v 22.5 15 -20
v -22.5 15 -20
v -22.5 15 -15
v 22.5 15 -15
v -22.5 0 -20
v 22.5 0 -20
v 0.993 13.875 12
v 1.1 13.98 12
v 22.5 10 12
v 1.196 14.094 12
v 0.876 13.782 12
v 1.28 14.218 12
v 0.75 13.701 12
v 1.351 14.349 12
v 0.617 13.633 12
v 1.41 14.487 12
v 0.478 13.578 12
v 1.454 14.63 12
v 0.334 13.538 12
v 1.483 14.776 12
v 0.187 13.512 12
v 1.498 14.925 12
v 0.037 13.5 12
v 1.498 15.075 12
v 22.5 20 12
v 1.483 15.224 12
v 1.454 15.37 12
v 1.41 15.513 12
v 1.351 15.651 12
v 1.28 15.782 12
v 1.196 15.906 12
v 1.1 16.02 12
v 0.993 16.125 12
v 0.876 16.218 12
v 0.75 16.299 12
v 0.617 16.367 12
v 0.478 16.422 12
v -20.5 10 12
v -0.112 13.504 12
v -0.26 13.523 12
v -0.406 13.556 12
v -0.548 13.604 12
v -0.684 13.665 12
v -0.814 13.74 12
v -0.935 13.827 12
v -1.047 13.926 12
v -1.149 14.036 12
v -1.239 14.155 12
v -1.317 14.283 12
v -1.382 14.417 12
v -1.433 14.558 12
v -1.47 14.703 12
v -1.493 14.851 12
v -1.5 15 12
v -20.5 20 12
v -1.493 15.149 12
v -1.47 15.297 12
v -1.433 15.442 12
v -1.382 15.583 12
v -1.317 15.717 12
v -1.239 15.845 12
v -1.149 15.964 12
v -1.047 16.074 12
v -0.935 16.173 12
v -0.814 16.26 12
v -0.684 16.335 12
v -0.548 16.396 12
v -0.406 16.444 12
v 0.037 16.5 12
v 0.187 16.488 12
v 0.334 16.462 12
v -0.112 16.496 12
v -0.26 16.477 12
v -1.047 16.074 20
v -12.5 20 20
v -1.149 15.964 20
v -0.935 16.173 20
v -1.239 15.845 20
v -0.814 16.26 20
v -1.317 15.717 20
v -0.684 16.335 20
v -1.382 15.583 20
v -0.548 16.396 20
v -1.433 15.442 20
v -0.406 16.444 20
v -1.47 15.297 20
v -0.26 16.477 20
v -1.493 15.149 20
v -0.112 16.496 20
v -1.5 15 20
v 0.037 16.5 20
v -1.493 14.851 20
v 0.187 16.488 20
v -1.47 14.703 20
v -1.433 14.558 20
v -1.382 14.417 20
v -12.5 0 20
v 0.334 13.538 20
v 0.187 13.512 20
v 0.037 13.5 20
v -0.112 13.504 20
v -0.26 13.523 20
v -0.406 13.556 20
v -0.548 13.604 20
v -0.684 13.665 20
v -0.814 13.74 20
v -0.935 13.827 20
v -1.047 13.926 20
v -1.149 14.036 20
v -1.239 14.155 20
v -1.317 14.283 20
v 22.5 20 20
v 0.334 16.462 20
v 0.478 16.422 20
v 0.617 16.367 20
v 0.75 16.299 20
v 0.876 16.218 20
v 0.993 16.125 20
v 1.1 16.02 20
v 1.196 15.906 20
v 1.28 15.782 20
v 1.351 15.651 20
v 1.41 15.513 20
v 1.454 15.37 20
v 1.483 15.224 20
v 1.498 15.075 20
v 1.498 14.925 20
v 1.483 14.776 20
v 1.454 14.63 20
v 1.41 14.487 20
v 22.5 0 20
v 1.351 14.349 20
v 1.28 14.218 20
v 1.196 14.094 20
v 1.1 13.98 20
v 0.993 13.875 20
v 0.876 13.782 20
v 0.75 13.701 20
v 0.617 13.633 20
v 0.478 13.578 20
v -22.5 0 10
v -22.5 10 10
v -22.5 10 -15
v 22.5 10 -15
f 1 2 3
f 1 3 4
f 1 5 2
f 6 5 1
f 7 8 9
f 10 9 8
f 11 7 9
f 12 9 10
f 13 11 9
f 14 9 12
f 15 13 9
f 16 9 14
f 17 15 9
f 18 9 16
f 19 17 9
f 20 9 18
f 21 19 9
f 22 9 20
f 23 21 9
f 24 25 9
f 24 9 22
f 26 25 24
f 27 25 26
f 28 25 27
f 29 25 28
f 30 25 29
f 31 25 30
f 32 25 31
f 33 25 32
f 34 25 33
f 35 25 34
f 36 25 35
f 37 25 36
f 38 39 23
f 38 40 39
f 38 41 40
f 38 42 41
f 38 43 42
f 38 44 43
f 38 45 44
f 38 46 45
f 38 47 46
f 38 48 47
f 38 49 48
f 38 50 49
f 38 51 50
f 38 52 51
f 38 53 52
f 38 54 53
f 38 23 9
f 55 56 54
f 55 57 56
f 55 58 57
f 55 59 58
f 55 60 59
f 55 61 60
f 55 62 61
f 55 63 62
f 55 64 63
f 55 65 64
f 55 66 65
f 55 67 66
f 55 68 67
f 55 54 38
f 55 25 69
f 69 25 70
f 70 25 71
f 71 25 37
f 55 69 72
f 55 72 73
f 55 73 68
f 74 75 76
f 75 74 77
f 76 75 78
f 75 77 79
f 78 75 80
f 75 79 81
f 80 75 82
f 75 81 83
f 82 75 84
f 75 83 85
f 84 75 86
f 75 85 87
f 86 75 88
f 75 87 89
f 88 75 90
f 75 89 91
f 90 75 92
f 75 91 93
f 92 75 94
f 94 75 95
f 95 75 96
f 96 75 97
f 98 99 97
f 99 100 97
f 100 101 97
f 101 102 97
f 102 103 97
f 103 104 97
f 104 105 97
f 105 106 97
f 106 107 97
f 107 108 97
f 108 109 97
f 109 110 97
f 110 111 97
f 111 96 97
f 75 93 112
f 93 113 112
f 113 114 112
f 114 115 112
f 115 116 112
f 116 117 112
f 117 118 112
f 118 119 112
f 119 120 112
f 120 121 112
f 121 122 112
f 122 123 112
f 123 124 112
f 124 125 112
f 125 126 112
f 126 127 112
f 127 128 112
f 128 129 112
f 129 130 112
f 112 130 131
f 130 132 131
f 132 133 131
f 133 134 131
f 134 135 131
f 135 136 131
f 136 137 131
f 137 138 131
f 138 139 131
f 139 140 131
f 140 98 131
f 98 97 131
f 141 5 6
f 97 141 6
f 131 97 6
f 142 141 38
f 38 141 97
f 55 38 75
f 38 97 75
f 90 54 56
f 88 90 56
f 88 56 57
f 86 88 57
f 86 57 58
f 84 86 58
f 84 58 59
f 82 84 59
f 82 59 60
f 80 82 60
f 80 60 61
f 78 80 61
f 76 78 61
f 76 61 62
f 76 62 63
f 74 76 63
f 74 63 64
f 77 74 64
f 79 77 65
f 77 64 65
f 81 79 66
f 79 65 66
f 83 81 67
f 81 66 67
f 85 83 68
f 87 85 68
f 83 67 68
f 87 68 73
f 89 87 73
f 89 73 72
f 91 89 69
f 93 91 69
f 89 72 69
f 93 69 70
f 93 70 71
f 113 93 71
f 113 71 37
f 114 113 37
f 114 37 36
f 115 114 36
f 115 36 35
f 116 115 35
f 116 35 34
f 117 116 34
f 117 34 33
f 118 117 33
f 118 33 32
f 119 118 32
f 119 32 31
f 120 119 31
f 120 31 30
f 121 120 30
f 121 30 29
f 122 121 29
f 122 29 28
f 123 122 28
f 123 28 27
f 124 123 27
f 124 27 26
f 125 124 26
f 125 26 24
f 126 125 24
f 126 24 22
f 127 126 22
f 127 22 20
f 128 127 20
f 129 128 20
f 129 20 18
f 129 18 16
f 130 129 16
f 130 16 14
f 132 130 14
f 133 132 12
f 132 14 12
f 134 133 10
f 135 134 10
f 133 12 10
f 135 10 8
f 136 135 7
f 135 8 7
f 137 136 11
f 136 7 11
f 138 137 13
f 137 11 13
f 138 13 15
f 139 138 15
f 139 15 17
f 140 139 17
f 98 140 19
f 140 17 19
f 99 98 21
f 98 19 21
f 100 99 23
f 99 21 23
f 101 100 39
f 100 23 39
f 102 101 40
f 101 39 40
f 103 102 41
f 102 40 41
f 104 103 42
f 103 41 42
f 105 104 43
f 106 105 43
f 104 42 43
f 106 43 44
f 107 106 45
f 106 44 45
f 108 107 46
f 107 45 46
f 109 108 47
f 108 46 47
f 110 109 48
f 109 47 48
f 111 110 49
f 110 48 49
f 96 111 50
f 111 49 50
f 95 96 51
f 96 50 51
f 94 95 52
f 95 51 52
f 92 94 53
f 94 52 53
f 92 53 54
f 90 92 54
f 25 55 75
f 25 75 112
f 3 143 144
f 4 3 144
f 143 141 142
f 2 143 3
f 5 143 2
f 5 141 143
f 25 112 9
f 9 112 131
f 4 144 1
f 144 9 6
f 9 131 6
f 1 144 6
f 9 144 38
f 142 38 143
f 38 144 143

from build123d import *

# Parameters (mm, degrees)
SKETCH_1_W          = 45
SKETCH_1_H          = 40
EXTRUDE_1_DEPTH     = 20
SKETCH_2_W          = 45
SKETCH_2_H          = 10
CUT_EXTRUDE_1_DEPTH = 32
SKETCH_3_W          = 45
SKETCH_3_H          = 5
EXTRUDE_2_DEPTH     = 5
SKETCH_4_R          = 1.5
CUT_EXTRUDE_2_DEPTH = 44.934610502
CHAMFER_1_SIZE      = 10


with BuildPart() as part:
    # 草图1 → 凸台-拉伸1 (new body)
    with BuildSketch(Plane(origin=(0, 0, 0), x_dir=(1, 0, 0), z_dir=(0, 1, 0))):
        Rectangle(SKETCH_1_W, SKETCH_1_H)
    extrude(amount=EXTRUDE_1_DEPTH)

    # 草图2 → 切除-拉伸1 (cut)
    with BuildSketch(Plane(origin=(0, 0, -20), x_dir=(-1, 0, 0), z_dir=(0, 0, -1))):
        with Locations((0, 15)):
            Rectangle(SKETCH_2_W, SKETCH_2_H)
    extrude(amount=-CUT_EXTRUDE_1_DEPTH, mode=Mode.SUBTRACT)

    # 草图3 → 凸台-拉伸2 (add)
    with BuildSketch(Plane(origin=(0, 10, 0), x_dir=(1, 0, 0), z_dir=(0, 1, 0))):
        with Locations((0, 17.5)):
            Rectangle(SKETCH_3_W, SKETCH_3_H)
    extrude(amount=EXTRUDE_2_DEPTH)

    # 草图4 → 切除-拉伸2 (cut, through all)
    with BuildSketch(Plane(origin=(0, 0, 12), x_dir=(-1, 0, 0), z_dir=(0, 0, -1))):
        with Locations((0, 15)):
            Circle(SKETCH_4_R)
    extrude(amount=-CUT_EXTRUDE_2_DEPTH, mode=Mode.SUBTRACT)

    # 倒角1
    chamfer_1_edges = [part.edges().sort_by_distance(p)[0] for p in [
        (-22.5, 10, 20),
    ]]
    chamfer(chamfer_1_edges, length=CHAMFER_1_SIZE)


solid = part.part
